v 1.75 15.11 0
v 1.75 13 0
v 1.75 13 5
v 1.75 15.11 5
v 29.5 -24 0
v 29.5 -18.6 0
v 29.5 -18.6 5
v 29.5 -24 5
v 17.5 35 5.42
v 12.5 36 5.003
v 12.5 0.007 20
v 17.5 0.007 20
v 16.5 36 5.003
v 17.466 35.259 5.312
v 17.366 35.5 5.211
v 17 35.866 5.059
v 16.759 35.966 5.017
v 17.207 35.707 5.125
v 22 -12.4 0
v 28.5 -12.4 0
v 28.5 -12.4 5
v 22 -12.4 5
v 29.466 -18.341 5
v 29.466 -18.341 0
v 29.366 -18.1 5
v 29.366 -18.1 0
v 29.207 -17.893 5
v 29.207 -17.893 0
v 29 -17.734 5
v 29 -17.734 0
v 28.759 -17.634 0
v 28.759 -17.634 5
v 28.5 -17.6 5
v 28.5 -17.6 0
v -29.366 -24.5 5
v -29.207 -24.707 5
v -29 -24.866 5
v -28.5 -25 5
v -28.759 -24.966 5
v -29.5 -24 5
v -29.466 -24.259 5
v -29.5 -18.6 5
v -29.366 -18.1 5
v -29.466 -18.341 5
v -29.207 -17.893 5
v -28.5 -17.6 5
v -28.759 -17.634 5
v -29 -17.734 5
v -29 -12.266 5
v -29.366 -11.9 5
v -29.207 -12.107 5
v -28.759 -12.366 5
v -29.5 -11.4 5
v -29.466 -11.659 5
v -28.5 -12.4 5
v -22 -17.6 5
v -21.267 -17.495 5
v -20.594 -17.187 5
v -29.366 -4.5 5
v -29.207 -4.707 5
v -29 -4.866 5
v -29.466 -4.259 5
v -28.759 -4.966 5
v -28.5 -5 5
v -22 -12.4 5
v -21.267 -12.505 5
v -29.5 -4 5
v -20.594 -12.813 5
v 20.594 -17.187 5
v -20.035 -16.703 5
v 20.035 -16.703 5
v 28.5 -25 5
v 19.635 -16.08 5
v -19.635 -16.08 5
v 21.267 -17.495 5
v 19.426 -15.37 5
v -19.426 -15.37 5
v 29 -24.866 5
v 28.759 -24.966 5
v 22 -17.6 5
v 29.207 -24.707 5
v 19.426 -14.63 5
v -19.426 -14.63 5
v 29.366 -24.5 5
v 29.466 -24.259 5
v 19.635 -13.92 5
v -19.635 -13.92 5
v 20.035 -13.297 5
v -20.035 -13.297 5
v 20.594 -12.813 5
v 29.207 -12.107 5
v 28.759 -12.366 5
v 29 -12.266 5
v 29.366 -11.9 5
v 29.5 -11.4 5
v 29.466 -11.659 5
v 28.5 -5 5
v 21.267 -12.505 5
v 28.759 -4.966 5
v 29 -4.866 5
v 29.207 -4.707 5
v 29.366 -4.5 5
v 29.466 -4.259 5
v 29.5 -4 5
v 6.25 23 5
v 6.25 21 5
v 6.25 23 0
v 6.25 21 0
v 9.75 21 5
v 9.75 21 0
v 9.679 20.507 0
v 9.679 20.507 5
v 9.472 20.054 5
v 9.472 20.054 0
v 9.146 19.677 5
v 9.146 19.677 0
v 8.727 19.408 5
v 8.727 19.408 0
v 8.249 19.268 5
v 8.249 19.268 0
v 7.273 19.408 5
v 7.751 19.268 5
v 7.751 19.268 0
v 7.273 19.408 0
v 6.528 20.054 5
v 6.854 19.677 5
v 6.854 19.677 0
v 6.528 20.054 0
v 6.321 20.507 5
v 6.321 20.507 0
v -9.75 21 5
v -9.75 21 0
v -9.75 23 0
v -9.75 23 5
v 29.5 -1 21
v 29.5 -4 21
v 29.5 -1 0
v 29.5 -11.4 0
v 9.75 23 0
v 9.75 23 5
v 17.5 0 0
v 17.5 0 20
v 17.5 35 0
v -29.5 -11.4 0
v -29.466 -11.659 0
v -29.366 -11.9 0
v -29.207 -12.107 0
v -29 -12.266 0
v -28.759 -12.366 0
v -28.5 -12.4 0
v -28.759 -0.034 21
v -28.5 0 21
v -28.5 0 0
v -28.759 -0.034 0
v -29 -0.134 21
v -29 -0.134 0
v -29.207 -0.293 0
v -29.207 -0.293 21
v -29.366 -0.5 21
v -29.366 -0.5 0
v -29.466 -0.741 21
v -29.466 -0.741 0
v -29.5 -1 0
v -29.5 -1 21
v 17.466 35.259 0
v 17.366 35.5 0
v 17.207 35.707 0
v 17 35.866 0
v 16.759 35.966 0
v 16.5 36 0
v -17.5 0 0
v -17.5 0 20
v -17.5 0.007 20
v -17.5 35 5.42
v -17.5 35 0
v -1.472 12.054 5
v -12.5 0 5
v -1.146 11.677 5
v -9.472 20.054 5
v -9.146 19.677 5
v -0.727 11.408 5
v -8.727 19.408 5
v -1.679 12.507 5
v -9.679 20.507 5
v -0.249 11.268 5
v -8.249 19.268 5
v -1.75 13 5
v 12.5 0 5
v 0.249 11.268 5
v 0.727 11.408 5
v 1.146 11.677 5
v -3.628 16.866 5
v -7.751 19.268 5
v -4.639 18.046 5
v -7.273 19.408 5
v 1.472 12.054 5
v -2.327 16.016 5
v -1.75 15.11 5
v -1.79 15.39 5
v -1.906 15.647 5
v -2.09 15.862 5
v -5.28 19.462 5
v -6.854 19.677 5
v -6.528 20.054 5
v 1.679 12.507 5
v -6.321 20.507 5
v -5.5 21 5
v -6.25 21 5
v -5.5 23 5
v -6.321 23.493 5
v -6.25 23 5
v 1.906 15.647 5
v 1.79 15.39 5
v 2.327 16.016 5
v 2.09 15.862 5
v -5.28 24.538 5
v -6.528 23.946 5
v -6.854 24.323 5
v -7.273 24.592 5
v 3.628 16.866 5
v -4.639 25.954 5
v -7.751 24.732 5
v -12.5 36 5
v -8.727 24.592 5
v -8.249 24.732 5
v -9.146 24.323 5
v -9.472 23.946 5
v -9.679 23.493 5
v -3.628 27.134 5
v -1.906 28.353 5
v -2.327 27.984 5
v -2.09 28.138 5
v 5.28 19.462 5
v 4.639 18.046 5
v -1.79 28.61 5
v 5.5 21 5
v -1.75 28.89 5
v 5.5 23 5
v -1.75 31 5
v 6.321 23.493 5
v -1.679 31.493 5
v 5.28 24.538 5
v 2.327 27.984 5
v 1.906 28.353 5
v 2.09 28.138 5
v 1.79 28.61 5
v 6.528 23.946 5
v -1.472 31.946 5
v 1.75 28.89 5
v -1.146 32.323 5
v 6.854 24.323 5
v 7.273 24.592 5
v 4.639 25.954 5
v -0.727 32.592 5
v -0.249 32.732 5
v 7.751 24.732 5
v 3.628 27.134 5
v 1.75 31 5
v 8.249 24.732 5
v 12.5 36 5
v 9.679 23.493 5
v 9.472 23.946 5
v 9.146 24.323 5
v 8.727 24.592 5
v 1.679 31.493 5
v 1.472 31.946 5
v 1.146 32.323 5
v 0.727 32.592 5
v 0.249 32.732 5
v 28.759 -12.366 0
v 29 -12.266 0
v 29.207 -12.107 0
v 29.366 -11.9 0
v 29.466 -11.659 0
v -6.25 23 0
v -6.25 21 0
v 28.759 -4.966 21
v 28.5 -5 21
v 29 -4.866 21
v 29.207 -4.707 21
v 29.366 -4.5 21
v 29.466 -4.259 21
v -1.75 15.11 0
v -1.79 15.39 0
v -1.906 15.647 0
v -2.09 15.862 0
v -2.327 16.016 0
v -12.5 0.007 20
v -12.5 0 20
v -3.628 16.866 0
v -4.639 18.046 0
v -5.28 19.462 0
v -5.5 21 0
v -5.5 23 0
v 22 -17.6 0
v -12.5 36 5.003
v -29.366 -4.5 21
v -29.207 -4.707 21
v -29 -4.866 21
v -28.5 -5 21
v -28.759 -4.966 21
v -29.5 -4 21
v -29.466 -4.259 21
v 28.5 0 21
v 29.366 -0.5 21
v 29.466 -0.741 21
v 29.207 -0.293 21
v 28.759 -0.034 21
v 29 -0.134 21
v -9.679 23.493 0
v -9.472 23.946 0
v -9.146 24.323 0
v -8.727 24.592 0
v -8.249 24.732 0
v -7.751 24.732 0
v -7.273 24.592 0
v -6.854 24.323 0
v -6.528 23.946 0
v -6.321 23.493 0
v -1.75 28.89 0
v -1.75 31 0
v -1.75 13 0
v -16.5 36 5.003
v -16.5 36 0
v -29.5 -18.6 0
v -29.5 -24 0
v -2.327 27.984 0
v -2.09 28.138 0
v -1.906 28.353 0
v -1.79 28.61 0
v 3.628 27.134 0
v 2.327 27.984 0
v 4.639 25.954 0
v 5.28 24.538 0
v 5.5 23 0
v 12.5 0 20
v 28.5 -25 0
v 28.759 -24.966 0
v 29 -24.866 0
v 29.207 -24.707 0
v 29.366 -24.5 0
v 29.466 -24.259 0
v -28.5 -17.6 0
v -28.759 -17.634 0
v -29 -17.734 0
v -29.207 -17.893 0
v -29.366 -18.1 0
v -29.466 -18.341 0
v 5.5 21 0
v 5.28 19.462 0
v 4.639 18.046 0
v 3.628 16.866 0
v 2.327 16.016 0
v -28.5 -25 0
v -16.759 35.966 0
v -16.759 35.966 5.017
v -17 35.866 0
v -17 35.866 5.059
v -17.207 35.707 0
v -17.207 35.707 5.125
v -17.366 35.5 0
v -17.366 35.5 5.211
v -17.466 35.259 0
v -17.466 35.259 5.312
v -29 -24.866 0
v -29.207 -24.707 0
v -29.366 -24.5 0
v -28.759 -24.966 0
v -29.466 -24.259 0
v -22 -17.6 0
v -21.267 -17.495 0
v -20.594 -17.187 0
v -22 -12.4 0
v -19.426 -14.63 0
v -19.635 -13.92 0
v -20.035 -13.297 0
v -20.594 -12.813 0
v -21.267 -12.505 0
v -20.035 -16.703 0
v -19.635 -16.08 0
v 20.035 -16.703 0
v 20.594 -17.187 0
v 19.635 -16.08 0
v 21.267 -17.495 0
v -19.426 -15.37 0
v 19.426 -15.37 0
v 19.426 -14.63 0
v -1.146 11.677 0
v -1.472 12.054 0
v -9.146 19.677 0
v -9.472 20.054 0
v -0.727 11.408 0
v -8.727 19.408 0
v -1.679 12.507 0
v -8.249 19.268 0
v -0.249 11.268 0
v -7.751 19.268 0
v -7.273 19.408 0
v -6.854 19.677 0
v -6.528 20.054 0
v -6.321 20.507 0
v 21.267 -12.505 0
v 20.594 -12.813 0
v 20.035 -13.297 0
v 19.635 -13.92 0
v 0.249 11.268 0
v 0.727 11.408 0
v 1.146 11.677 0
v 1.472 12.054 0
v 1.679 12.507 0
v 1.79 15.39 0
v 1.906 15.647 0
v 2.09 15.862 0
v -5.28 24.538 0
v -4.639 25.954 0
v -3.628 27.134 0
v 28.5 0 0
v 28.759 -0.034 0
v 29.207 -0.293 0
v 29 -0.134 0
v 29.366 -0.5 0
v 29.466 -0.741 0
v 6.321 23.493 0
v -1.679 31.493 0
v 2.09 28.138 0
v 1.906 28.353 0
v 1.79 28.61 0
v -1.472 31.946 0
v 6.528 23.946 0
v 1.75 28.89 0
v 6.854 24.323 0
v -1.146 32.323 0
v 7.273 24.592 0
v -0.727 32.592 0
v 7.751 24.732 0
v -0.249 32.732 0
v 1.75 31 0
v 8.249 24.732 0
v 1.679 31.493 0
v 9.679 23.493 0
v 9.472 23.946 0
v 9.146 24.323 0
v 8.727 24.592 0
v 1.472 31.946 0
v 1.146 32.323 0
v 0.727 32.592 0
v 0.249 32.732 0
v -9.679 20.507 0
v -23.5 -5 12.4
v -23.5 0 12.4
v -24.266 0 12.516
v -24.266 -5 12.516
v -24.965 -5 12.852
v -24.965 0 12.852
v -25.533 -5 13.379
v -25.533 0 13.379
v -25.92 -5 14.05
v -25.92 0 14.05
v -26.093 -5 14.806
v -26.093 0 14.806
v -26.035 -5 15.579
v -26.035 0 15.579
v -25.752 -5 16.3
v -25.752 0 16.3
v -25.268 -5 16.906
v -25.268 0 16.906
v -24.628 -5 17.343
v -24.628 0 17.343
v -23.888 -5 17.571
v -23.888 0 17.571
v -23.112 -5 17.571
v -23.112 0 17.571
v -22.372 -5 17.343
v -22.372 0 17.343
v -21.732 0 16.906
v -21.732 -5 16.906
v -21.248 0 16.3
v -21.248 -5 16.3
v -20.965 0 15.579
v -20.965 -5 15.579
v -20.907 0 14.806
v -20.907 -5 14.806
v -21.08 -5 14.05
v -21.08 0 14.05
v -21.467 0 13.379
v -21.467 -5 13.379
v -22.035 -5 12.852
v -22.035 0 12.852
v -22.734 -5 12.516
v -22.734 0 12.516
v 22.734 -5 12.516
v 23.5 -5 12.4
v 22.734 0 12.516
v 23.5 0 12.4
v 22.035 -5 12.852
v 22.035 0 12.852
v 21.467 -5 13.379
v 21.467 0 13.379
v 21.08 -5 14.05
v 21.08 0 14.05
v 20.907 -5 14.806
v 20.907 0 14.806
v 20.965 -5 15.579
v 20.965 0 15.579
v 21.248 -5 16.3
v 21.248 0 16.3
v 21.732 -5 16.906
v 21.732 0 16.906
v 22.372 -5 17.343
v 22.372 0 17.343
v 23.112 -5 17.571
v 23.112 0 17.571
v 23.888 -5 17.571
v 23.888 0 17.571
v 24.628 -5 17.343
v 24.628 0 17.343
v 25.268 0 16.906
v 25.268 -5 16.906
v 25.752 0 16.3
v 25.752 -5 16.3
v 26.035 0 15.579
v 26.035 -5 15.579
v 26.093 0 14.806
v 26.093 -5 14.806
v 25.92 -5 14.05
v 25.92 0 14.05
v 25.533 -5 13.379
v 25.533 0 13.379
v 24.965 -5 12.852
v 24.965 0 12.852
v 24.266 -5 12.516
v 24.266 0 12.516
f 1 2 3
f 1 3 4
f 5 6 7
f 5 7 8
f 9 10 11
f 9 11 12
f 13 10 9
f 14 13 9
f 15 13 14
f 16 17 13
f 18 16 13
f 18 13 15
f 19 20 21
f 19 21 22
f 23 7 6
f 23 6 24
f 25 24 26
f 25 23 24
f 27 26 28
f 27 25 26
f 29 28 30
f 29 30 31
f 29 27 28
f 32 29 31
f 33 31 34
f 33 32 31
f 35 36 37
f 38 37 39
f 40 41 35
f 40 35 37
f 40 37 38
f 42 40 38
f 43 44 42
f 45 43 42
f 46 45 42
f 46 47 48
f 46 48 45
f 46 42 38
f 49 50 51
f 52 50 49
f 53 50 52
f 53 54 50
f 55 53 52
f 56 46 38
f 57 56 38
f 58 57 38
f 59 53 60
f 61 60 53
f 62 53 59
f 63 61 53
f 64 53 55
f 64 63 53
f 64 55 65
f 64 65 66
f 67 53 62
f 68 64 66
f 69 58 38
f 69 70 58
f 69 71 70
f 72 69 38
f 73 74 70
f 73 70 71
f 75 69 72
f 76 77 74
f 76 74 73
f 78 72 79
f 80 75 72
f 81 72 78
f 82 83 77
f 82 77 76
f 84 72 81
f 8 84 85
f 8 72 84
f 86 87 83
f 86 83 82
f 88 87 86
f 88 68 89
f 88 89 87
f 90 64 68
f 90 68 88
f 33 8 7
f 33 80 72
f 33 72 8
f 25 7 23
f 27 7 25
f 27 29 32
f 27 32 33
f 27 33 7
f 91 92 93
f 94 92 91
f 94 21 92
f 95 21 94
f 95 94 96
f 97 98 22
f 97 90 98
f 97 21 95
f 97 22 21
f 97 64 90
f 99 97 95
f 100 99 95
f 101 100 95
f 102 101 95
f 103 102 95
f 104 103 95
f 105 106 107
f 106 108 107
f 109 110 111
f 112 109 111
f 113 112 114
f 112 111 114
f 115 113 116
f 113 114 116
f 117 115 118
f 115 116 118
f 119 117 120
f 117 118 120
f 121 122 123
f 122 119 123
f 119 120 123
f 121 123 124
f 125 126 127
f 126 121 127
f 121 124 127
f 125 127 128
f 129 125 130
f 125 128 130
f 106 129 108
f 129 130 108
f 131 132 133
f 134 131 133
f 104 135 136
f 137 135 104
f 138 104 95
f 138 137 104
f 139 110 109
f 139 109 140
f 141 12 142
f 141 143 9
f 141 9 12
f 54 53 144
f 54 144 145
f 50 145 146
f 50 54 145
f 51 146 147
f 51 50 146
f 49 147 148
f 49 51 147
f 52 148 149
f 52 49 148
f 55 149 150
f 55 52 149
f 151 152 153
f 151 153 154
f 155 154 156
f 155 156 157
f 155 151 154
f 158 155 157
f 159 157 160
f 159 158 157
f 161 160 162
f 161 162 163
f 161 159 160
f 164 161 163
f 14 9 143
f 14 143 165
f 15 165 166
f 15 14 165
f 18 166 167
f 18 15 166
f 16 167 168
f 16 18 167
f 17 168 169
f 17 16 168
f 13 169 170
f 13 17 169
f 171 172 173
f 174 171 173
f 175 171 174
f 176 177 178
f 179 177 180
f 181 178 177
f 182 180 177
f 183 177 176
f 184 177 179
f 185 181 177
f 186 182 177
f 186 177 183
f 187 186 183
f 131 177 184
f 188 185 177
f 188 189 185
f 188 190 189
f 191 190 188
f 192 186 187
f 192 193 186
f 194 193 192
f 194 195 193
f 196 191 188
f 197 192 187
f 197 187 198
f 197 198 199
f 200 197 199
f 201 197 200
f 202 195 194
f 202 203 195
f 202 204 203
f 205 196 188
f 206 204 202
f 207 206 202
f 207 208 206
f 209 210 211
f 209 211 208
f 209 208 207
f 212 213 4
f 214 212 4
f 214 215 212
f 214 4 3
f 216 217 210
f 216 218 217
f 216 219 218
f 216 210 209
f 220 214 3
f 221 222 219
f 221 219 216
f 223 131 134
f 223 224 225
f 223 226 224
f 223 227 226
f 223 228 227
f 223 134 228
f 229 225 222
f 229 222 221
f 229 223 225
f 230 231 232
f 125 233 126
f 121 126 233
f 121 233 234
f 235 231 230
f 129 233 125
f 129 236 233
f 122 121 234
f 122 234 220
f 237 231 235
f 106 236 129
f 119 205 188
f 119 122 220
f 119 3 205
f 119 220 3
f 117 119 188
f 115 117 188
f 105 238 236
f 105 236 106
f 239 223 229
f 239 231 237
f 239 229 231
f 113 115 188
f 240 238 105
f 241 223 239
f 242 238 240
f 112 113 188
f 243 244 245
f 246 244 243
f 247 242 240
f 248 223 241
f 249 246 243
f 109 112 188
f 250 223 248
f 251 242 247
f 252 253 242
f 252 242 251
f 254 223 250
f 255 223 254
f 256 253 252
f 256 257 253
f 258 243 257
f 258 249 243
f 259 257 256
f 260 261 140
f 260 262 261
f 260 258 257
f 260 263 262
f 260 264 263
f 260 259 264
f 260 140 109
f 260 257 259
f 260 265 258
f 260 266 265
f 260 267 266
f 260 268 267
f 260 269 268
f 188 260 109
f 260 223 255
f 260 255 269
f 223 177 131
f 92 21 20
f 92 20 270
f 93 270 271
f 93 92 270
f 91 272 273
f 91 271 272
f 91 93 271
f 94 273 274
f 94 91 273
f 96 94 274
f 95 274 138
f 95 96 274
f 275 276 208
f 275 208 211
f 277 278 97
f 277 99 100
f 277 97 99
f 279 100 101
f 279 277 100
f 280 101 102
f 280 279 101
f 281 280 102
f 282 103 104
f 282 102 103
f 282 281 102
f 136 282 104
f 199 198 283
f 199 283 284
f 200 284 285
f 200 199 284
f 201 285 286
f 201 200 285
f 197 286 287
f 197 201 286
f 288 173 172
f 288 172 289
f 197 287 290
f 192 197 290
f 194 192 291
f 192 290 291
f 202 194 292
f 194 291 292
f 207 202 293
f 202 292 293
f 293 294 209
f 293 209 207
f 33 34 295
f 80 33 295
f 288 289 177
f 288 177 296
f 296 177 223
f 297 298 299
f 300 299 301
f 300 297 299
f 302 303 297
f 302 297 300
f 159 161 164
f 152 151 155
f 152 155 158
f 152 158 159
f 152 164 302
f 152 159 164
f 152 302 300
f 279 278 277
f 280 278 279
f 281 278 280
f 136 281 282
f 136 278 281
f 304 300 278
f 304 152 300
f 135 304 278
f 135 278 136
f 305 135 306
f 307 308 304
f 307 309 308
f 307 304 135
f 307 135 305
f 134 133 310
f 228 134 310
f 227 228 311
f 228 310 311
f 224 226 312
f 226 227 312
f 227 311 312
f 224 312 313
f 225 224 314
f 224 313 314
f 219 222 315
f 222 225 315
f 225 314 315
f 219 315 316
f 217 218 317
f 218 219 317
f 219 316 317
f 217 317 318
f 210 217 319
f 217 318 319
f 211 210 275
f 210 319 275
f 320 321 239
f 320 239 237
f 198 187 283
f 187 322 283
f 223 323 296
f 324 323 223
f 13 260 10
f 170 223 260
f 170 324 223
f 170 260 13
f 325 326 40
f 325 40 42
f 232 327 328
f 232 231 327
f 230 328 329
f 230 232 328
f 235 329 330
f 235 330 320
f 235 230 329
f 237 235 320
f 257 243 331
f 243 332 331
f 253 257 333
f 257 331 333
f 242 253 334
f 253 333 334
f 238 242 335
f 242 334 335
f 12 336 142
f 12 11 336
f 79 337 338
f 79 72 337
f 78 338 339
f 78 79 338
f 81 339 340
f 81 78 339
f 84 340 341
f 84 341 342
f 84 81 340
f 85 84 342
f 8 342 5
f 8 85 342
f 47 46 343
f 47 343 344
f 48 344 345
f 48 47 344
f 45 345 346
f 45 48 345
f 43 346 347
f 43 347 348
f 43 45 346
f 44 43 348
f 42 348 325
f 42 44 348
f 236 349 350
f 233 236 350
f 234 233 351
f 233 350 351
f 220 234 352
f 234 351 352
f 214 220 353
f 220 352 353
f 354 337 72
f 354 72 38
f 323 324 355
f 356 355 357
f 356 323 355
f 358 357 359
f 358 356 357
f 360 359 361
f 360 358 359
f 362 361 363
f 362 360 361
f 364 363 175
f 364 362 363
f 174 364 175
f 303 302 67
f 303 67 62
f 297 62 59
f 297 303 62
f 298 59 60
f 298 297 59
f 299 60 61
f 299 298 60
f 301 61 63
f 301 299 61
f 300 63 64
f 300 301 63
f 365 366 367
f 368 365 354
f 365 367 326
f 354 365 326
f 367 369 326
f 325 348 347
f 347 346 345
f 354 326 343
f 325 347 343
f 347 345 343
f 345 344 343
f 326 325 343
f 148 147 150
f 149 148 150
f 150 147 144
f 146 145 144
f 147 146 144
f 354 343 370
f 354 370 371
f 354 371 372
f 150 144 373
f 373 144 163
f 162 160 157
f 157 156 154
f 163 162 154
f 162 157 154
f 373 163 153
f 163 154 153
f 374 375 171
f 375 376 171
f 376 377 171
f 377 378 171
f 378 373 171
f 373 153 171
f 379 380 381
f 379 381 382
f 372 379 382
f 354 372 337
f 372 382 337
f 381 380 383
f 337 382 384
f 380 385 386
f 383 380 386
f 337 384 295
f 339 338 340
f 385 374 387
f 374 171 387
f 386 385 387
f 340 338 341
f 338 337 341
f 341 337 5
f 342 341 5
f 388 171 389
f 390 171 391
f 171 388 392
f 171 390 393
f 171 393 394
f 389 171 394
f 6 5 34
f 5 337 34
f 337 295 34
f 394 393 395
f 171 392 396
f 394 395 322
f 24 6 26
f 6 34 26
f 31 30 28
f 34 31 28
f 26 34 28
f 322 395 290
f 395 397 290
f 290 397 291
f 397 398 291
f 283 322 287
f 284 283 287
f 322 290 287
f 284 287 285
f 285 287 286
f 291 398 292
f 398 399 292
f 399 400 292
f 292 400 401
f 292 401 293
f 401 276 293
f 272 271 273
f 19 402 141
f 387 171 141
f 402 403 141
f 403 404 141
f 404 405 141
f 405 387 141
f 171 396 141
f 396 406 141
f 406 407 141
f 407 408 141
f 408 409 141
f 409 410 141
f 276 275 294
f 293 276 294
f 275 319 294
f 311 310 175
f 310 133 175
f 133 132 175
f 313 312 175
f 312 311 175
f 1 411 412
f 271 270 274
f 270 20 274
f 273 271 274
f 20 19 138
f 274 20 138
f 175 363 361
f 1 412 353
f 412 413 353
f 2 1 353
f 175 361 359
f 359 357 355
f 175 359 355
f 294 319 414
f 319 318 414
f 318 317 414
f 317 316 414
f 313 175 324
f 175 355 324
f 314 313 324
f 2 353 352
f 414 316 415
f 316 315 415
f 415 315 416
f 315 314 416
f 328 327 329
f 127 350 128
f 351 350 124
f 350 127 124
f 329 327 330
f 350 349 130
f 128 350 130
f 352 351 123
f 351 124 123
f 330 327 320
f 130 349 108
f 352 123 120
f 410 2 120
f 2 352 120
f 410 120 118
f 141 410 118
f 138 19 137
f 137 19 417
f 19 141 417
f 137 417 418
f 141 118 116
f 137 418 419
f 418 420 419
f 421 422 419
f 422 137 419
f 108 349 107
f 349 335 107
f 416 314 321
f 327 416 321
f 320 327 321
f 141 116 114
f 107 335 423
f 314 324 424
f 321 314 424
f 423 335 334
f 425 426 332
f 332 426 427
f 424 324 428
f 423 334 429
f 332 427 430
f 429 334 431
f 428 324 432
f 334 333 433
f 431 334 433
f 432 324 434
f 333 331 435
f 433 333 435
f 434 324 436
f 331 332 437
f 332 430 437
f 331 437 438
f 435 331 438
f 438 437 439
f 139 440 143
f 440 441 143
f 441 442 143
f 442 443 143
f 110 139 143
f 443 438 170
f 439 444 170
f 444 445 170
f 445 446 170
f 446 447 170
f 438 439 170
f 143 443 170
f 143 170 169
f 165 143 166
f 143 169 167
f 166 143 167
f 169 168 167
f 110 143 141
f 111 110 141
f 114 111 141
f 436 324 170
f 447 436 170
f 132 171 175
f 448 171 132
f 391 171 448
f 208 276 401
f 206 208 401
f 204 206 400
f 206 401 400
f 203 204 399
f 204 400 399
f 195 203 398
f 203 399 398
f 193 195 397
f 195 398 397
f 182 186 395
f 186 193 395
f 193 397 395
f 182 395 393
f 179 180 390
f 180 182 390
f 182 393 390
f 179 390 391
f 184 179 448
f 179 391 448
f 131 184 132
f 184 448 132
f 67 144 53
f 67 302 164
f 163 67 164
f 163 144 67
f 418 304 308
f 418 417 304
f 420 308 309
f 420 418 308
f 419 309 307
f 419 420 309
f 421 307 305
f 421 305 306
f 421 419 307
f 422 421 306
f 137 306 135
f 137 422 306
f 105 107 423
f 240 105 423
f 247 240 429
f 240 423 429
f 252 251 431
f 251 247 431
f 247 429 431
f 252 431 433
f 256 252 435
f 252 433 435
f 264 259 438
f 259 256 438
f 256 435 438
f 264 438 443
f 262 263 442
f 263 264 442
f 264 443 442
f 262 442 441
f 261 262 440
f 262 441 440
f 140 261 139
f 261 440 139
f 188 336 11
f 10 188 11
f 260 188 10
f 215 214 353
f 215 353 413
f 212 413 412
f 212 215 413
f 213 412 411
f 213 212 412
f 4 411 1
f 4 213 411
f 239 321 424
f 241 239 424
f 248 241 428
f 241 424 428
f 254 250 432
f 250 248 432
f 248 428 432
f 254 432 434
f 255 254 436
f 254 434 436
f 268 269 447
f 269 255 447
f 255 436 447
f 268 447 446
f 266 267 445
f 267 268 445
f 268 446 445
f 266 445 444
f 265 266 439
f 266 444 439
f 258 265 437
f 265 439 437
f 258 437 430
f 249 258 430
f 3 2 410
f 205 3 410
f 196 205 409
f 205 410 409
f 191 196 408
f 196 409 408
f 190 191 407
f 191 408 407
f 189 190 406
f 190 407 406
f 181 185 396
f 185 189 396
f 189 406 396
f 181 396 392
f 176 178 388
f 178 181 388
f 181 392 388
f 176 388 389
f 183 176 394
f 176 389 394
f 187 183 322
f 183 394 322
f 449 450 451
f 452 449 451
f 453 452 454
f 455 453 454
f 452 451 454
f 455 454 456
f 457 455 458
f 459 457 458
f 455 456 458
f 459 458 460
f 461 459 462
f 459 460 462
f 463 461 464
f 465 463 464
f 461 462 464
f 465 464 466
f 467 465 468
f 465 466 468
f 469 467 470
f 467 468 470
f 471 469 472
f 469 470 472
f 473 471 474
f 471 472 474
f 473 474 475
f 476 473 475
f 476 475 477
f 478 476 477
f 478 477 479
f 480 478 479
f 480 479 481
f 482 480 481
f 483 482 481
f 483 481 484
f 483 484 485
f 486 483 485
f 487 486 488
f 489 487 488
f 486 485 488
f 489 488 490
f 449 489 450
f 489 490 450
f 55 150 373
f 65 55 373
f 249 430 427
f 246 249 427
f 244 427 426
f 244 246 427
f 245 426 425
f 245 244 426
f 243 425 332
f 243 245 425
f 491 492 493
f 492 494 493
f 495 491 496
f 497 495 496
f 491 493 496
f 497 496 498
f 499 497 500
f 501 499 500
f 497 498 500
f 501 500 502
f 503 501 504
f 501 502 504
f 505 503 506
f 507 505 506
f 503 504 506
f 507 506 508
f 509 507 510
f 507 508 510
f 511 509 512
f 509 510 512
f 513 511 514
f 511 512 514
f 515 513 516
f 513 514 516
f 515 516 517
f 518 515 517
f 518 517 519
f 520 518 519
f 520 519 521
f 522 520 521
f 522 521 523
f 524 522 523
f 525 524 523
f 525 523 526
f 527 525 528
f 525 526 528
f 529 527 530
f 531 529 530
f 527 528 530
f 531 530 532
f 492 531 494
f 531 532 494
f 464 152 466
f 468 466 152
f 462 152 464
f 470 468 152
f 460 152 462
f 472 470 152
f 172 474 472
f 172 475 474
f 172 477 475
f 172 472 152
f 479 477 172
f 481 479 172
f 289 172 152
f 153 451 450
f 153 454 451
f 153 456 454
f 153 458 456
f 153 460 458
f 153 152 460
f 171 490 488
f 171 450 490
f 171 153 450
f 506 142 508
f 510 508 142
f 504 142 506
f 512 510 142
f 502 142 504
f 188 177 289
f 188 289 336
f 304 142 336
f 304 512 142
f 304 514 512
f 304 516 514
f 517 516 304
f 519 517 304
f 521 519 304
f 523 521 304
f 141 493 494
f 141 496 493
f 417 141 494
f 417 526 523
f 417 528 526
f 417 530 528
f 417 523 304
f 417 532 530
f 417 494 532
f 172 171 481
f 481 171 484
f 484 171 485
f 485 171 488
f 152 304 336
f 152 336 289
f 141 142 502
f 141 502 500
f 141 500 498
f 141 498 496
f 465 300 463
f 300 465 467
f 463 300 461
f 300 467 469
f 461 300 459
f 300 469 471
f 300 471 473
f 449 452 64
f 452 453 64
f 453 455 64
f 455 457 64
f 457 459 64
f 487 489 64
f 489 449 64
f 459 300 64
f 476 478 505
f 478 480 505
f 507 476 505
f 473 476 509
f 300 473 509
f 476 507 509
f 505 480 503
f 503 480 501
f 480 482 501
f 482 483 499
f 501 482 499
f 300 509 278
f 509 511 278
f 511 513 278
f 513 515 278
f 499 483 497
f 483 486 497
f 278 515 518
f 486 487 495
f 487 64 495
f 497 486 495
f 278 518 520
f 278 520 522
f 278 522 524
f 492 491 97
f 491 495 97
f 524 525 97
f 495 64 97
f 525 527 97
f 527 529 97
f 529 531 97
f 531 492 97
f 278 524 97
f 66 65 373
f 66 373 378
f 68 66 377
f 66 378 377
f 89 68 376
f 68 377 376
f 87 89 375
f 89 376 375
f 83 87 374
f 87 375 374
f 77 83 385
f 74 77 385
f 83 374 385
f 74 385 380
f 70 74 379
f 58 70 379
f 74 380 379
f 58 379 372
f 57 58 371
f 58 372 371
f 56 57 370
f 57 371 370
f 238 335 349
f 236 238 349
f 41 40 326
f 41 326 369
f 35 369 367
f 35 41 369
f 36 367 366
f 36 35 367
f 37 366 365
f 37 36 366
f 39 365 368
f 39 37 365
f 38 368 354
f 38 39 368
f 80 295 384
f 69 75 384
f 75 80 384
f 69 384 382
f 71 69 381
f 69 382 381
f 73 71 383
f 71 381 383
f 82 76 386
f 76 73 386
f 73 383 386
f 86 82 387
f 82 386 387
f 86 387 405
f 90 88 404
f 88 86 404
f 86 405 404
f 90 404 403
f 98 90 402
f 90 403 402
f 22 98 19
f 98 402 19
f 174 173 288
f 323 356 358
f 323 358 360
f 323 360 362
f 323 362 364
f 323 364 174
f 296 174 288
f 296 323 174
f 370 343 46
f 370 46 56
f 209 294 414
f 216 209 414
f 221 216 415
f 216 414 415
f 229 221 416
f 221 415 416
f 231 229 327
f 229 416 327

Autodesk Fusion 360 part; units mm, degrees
sketch "スケッチ1" plane through (0, 0, 0) normal (0, 0, 1) x (1, 0, 0)
  line L0 (-17.5, 0) -> (-17.5, 36)
  line L1 (-17.5, 36) -> (17.5, 36)
  line L2 (17.5, 36) -> (17.5, 0)
  line L3 (-29.5, 0) -> (29.5, 0)
  line L4 (29.5, 0) -> (29.5, -25)
  line L5 (29.5, -25) -> (-29.5, -25)
  line L6 (-29.5, -25) -> (-29.5, 0)
  line L7 (-29.5, -5) -> (29.5, -5)
  line L8 (-12.5, 0) -> (-12.5, 36)
  line L9 (12.5, 0) -> (12.5, 36)
  circle A0 centre (22, -15) radius 2.6
  circle A1 centre (-22, -15) radius 2.6
  line L10 (29.5, -12.4) -> (22, -12.4)
  line L11 (29.5, -17.6) -> (22, -17.6)
  line L12 (-29.5, -12.4) -> (-22, -12.4)
  line L13 (-29.5, -17.6) -> (-22, -17.6)
  circle A2 centre (0, 23) radius 5.5
  circle A3 centre (0, 21) radius 5.5
  circle A4 centre (0, 31) radius 1.75
  circle A5 centre (0, 13) radius 1.75
  line L14 (0, 36) -> (0, 0) construction
  line L15 (1.75, 31) -> (1.75, 28.2142)
  line L16 (-1.75, 31) -> (-1.75, 28.2142)
  line L17 (1.75, 13) -> (1.75, 15.7858)
  line L18 (-1.75, 13) -> (-1.75, 15.7858)
  line L19 (5.5, 23) -> (5.5, 21)
  line L20 (-8, 23) -> (-8, 21)
  circle A6 centre (-8, 23) radius 1.75
  circle A7 centre (-8, 21) radius 1.75
  line L21 (-6.25, 21) -> (-6.25, 23)
  line L22 (-9.75, 21) -> (-9.75, 23)
  circle A8 centre (8, 23) radius 1.75
  line L23 (6.25, 21) -> (6.25, 23)
  circle A9 centre (8, 21) radius 1.75
  line L24 (9.75, 21) -> (9.75, 23)
  line L25 (-5.5, 23) -> (-5.5, 21)
  dimension "d1" = 36
  dimension "d2" = 25
  dimension "d3" = 5
  dimension "d4" = 35
  dimension "d5" = 59
  dimension "d6" = 17.5
  dimension "d7" = 5
  dimension "d8" = 5
  dimension "d9" = 5.2
  dimension "d10" = 5.2
  dimension "d11" = 7.5
  dimension "d12" = 7.5
  dimension "d13" = 10
  dimension "d14" = 10
  dimension "d15" = 11
  dimension "d16" = 11
  dimension "d17" = 3.5
  dimension "d18" = 3.5
  dimension "d19" = 5
  dimension "d20" = 18
  dimension "d21" = 2
  dimension "d22" = 8
  dimension "d23" = 2
  dimension "d24" = 3.5
  dimension "d25" = 3.5
  dimension "d26" = 8
  dimension "d27" = 8
extrude "押し出し1" add sketch "スケッチ1" along normal blind 5 contours L3 L4 L6 L7 | L1 L3 L8 L9 | L4 L5 L6 L7 A0 A1 L10 L11 L12 L13
extrude "押し出し2" add sketch "スケッチ1" along normal blind 21 contours L3 L4 L6 L7
extrude "押し出し3" add sketch "スケッチ1" along normal blind 20 contours L0 L1 L3 L8 | L1 L2 L3 L9
chamfer "面取り1" distance 36 distance2 15 2 edges at (-15, 36, 20) (15, 36, 20) measured on face at (-15.8333, 24, 20) measured on face at (14.1667, 12, 20)
hole "穴1" at (23.5, -5, 15) direction (0, 1, 0) diameter 5.2 depth 6 tip angle 118
hole "穴2" at (-23.5, -5, 15) direction (0, 1, 0) diameter 5.2 depth 6 tip angle 118
fillet "フィレット1" radius 1 12 edges at (29.5, -25, 2.5) (29.5, -17.6, 2.5) (29.5, -12.4, 2.5) (29.5, -5, 13) (29.5, 0, 10.5) (17.5, 36, 2.5) (-17.5, 36, 2.5) (-29.5, 0, 10.5) (-29.5, -5, 13) (-29.5, -25, 2.5) (-29.5, -17.6, 2.5) (-29.5, -12.4, 2.5)
fillet "フィレット2" radius 1 4 edges at (1.75, 28.2142, 2.5) (1.75, 15.7858, 2.5) (-1.75, 15.7858, 2.5) (-1.75, 28.2142, 2.5)
equation "d6 = d4 / 2"
